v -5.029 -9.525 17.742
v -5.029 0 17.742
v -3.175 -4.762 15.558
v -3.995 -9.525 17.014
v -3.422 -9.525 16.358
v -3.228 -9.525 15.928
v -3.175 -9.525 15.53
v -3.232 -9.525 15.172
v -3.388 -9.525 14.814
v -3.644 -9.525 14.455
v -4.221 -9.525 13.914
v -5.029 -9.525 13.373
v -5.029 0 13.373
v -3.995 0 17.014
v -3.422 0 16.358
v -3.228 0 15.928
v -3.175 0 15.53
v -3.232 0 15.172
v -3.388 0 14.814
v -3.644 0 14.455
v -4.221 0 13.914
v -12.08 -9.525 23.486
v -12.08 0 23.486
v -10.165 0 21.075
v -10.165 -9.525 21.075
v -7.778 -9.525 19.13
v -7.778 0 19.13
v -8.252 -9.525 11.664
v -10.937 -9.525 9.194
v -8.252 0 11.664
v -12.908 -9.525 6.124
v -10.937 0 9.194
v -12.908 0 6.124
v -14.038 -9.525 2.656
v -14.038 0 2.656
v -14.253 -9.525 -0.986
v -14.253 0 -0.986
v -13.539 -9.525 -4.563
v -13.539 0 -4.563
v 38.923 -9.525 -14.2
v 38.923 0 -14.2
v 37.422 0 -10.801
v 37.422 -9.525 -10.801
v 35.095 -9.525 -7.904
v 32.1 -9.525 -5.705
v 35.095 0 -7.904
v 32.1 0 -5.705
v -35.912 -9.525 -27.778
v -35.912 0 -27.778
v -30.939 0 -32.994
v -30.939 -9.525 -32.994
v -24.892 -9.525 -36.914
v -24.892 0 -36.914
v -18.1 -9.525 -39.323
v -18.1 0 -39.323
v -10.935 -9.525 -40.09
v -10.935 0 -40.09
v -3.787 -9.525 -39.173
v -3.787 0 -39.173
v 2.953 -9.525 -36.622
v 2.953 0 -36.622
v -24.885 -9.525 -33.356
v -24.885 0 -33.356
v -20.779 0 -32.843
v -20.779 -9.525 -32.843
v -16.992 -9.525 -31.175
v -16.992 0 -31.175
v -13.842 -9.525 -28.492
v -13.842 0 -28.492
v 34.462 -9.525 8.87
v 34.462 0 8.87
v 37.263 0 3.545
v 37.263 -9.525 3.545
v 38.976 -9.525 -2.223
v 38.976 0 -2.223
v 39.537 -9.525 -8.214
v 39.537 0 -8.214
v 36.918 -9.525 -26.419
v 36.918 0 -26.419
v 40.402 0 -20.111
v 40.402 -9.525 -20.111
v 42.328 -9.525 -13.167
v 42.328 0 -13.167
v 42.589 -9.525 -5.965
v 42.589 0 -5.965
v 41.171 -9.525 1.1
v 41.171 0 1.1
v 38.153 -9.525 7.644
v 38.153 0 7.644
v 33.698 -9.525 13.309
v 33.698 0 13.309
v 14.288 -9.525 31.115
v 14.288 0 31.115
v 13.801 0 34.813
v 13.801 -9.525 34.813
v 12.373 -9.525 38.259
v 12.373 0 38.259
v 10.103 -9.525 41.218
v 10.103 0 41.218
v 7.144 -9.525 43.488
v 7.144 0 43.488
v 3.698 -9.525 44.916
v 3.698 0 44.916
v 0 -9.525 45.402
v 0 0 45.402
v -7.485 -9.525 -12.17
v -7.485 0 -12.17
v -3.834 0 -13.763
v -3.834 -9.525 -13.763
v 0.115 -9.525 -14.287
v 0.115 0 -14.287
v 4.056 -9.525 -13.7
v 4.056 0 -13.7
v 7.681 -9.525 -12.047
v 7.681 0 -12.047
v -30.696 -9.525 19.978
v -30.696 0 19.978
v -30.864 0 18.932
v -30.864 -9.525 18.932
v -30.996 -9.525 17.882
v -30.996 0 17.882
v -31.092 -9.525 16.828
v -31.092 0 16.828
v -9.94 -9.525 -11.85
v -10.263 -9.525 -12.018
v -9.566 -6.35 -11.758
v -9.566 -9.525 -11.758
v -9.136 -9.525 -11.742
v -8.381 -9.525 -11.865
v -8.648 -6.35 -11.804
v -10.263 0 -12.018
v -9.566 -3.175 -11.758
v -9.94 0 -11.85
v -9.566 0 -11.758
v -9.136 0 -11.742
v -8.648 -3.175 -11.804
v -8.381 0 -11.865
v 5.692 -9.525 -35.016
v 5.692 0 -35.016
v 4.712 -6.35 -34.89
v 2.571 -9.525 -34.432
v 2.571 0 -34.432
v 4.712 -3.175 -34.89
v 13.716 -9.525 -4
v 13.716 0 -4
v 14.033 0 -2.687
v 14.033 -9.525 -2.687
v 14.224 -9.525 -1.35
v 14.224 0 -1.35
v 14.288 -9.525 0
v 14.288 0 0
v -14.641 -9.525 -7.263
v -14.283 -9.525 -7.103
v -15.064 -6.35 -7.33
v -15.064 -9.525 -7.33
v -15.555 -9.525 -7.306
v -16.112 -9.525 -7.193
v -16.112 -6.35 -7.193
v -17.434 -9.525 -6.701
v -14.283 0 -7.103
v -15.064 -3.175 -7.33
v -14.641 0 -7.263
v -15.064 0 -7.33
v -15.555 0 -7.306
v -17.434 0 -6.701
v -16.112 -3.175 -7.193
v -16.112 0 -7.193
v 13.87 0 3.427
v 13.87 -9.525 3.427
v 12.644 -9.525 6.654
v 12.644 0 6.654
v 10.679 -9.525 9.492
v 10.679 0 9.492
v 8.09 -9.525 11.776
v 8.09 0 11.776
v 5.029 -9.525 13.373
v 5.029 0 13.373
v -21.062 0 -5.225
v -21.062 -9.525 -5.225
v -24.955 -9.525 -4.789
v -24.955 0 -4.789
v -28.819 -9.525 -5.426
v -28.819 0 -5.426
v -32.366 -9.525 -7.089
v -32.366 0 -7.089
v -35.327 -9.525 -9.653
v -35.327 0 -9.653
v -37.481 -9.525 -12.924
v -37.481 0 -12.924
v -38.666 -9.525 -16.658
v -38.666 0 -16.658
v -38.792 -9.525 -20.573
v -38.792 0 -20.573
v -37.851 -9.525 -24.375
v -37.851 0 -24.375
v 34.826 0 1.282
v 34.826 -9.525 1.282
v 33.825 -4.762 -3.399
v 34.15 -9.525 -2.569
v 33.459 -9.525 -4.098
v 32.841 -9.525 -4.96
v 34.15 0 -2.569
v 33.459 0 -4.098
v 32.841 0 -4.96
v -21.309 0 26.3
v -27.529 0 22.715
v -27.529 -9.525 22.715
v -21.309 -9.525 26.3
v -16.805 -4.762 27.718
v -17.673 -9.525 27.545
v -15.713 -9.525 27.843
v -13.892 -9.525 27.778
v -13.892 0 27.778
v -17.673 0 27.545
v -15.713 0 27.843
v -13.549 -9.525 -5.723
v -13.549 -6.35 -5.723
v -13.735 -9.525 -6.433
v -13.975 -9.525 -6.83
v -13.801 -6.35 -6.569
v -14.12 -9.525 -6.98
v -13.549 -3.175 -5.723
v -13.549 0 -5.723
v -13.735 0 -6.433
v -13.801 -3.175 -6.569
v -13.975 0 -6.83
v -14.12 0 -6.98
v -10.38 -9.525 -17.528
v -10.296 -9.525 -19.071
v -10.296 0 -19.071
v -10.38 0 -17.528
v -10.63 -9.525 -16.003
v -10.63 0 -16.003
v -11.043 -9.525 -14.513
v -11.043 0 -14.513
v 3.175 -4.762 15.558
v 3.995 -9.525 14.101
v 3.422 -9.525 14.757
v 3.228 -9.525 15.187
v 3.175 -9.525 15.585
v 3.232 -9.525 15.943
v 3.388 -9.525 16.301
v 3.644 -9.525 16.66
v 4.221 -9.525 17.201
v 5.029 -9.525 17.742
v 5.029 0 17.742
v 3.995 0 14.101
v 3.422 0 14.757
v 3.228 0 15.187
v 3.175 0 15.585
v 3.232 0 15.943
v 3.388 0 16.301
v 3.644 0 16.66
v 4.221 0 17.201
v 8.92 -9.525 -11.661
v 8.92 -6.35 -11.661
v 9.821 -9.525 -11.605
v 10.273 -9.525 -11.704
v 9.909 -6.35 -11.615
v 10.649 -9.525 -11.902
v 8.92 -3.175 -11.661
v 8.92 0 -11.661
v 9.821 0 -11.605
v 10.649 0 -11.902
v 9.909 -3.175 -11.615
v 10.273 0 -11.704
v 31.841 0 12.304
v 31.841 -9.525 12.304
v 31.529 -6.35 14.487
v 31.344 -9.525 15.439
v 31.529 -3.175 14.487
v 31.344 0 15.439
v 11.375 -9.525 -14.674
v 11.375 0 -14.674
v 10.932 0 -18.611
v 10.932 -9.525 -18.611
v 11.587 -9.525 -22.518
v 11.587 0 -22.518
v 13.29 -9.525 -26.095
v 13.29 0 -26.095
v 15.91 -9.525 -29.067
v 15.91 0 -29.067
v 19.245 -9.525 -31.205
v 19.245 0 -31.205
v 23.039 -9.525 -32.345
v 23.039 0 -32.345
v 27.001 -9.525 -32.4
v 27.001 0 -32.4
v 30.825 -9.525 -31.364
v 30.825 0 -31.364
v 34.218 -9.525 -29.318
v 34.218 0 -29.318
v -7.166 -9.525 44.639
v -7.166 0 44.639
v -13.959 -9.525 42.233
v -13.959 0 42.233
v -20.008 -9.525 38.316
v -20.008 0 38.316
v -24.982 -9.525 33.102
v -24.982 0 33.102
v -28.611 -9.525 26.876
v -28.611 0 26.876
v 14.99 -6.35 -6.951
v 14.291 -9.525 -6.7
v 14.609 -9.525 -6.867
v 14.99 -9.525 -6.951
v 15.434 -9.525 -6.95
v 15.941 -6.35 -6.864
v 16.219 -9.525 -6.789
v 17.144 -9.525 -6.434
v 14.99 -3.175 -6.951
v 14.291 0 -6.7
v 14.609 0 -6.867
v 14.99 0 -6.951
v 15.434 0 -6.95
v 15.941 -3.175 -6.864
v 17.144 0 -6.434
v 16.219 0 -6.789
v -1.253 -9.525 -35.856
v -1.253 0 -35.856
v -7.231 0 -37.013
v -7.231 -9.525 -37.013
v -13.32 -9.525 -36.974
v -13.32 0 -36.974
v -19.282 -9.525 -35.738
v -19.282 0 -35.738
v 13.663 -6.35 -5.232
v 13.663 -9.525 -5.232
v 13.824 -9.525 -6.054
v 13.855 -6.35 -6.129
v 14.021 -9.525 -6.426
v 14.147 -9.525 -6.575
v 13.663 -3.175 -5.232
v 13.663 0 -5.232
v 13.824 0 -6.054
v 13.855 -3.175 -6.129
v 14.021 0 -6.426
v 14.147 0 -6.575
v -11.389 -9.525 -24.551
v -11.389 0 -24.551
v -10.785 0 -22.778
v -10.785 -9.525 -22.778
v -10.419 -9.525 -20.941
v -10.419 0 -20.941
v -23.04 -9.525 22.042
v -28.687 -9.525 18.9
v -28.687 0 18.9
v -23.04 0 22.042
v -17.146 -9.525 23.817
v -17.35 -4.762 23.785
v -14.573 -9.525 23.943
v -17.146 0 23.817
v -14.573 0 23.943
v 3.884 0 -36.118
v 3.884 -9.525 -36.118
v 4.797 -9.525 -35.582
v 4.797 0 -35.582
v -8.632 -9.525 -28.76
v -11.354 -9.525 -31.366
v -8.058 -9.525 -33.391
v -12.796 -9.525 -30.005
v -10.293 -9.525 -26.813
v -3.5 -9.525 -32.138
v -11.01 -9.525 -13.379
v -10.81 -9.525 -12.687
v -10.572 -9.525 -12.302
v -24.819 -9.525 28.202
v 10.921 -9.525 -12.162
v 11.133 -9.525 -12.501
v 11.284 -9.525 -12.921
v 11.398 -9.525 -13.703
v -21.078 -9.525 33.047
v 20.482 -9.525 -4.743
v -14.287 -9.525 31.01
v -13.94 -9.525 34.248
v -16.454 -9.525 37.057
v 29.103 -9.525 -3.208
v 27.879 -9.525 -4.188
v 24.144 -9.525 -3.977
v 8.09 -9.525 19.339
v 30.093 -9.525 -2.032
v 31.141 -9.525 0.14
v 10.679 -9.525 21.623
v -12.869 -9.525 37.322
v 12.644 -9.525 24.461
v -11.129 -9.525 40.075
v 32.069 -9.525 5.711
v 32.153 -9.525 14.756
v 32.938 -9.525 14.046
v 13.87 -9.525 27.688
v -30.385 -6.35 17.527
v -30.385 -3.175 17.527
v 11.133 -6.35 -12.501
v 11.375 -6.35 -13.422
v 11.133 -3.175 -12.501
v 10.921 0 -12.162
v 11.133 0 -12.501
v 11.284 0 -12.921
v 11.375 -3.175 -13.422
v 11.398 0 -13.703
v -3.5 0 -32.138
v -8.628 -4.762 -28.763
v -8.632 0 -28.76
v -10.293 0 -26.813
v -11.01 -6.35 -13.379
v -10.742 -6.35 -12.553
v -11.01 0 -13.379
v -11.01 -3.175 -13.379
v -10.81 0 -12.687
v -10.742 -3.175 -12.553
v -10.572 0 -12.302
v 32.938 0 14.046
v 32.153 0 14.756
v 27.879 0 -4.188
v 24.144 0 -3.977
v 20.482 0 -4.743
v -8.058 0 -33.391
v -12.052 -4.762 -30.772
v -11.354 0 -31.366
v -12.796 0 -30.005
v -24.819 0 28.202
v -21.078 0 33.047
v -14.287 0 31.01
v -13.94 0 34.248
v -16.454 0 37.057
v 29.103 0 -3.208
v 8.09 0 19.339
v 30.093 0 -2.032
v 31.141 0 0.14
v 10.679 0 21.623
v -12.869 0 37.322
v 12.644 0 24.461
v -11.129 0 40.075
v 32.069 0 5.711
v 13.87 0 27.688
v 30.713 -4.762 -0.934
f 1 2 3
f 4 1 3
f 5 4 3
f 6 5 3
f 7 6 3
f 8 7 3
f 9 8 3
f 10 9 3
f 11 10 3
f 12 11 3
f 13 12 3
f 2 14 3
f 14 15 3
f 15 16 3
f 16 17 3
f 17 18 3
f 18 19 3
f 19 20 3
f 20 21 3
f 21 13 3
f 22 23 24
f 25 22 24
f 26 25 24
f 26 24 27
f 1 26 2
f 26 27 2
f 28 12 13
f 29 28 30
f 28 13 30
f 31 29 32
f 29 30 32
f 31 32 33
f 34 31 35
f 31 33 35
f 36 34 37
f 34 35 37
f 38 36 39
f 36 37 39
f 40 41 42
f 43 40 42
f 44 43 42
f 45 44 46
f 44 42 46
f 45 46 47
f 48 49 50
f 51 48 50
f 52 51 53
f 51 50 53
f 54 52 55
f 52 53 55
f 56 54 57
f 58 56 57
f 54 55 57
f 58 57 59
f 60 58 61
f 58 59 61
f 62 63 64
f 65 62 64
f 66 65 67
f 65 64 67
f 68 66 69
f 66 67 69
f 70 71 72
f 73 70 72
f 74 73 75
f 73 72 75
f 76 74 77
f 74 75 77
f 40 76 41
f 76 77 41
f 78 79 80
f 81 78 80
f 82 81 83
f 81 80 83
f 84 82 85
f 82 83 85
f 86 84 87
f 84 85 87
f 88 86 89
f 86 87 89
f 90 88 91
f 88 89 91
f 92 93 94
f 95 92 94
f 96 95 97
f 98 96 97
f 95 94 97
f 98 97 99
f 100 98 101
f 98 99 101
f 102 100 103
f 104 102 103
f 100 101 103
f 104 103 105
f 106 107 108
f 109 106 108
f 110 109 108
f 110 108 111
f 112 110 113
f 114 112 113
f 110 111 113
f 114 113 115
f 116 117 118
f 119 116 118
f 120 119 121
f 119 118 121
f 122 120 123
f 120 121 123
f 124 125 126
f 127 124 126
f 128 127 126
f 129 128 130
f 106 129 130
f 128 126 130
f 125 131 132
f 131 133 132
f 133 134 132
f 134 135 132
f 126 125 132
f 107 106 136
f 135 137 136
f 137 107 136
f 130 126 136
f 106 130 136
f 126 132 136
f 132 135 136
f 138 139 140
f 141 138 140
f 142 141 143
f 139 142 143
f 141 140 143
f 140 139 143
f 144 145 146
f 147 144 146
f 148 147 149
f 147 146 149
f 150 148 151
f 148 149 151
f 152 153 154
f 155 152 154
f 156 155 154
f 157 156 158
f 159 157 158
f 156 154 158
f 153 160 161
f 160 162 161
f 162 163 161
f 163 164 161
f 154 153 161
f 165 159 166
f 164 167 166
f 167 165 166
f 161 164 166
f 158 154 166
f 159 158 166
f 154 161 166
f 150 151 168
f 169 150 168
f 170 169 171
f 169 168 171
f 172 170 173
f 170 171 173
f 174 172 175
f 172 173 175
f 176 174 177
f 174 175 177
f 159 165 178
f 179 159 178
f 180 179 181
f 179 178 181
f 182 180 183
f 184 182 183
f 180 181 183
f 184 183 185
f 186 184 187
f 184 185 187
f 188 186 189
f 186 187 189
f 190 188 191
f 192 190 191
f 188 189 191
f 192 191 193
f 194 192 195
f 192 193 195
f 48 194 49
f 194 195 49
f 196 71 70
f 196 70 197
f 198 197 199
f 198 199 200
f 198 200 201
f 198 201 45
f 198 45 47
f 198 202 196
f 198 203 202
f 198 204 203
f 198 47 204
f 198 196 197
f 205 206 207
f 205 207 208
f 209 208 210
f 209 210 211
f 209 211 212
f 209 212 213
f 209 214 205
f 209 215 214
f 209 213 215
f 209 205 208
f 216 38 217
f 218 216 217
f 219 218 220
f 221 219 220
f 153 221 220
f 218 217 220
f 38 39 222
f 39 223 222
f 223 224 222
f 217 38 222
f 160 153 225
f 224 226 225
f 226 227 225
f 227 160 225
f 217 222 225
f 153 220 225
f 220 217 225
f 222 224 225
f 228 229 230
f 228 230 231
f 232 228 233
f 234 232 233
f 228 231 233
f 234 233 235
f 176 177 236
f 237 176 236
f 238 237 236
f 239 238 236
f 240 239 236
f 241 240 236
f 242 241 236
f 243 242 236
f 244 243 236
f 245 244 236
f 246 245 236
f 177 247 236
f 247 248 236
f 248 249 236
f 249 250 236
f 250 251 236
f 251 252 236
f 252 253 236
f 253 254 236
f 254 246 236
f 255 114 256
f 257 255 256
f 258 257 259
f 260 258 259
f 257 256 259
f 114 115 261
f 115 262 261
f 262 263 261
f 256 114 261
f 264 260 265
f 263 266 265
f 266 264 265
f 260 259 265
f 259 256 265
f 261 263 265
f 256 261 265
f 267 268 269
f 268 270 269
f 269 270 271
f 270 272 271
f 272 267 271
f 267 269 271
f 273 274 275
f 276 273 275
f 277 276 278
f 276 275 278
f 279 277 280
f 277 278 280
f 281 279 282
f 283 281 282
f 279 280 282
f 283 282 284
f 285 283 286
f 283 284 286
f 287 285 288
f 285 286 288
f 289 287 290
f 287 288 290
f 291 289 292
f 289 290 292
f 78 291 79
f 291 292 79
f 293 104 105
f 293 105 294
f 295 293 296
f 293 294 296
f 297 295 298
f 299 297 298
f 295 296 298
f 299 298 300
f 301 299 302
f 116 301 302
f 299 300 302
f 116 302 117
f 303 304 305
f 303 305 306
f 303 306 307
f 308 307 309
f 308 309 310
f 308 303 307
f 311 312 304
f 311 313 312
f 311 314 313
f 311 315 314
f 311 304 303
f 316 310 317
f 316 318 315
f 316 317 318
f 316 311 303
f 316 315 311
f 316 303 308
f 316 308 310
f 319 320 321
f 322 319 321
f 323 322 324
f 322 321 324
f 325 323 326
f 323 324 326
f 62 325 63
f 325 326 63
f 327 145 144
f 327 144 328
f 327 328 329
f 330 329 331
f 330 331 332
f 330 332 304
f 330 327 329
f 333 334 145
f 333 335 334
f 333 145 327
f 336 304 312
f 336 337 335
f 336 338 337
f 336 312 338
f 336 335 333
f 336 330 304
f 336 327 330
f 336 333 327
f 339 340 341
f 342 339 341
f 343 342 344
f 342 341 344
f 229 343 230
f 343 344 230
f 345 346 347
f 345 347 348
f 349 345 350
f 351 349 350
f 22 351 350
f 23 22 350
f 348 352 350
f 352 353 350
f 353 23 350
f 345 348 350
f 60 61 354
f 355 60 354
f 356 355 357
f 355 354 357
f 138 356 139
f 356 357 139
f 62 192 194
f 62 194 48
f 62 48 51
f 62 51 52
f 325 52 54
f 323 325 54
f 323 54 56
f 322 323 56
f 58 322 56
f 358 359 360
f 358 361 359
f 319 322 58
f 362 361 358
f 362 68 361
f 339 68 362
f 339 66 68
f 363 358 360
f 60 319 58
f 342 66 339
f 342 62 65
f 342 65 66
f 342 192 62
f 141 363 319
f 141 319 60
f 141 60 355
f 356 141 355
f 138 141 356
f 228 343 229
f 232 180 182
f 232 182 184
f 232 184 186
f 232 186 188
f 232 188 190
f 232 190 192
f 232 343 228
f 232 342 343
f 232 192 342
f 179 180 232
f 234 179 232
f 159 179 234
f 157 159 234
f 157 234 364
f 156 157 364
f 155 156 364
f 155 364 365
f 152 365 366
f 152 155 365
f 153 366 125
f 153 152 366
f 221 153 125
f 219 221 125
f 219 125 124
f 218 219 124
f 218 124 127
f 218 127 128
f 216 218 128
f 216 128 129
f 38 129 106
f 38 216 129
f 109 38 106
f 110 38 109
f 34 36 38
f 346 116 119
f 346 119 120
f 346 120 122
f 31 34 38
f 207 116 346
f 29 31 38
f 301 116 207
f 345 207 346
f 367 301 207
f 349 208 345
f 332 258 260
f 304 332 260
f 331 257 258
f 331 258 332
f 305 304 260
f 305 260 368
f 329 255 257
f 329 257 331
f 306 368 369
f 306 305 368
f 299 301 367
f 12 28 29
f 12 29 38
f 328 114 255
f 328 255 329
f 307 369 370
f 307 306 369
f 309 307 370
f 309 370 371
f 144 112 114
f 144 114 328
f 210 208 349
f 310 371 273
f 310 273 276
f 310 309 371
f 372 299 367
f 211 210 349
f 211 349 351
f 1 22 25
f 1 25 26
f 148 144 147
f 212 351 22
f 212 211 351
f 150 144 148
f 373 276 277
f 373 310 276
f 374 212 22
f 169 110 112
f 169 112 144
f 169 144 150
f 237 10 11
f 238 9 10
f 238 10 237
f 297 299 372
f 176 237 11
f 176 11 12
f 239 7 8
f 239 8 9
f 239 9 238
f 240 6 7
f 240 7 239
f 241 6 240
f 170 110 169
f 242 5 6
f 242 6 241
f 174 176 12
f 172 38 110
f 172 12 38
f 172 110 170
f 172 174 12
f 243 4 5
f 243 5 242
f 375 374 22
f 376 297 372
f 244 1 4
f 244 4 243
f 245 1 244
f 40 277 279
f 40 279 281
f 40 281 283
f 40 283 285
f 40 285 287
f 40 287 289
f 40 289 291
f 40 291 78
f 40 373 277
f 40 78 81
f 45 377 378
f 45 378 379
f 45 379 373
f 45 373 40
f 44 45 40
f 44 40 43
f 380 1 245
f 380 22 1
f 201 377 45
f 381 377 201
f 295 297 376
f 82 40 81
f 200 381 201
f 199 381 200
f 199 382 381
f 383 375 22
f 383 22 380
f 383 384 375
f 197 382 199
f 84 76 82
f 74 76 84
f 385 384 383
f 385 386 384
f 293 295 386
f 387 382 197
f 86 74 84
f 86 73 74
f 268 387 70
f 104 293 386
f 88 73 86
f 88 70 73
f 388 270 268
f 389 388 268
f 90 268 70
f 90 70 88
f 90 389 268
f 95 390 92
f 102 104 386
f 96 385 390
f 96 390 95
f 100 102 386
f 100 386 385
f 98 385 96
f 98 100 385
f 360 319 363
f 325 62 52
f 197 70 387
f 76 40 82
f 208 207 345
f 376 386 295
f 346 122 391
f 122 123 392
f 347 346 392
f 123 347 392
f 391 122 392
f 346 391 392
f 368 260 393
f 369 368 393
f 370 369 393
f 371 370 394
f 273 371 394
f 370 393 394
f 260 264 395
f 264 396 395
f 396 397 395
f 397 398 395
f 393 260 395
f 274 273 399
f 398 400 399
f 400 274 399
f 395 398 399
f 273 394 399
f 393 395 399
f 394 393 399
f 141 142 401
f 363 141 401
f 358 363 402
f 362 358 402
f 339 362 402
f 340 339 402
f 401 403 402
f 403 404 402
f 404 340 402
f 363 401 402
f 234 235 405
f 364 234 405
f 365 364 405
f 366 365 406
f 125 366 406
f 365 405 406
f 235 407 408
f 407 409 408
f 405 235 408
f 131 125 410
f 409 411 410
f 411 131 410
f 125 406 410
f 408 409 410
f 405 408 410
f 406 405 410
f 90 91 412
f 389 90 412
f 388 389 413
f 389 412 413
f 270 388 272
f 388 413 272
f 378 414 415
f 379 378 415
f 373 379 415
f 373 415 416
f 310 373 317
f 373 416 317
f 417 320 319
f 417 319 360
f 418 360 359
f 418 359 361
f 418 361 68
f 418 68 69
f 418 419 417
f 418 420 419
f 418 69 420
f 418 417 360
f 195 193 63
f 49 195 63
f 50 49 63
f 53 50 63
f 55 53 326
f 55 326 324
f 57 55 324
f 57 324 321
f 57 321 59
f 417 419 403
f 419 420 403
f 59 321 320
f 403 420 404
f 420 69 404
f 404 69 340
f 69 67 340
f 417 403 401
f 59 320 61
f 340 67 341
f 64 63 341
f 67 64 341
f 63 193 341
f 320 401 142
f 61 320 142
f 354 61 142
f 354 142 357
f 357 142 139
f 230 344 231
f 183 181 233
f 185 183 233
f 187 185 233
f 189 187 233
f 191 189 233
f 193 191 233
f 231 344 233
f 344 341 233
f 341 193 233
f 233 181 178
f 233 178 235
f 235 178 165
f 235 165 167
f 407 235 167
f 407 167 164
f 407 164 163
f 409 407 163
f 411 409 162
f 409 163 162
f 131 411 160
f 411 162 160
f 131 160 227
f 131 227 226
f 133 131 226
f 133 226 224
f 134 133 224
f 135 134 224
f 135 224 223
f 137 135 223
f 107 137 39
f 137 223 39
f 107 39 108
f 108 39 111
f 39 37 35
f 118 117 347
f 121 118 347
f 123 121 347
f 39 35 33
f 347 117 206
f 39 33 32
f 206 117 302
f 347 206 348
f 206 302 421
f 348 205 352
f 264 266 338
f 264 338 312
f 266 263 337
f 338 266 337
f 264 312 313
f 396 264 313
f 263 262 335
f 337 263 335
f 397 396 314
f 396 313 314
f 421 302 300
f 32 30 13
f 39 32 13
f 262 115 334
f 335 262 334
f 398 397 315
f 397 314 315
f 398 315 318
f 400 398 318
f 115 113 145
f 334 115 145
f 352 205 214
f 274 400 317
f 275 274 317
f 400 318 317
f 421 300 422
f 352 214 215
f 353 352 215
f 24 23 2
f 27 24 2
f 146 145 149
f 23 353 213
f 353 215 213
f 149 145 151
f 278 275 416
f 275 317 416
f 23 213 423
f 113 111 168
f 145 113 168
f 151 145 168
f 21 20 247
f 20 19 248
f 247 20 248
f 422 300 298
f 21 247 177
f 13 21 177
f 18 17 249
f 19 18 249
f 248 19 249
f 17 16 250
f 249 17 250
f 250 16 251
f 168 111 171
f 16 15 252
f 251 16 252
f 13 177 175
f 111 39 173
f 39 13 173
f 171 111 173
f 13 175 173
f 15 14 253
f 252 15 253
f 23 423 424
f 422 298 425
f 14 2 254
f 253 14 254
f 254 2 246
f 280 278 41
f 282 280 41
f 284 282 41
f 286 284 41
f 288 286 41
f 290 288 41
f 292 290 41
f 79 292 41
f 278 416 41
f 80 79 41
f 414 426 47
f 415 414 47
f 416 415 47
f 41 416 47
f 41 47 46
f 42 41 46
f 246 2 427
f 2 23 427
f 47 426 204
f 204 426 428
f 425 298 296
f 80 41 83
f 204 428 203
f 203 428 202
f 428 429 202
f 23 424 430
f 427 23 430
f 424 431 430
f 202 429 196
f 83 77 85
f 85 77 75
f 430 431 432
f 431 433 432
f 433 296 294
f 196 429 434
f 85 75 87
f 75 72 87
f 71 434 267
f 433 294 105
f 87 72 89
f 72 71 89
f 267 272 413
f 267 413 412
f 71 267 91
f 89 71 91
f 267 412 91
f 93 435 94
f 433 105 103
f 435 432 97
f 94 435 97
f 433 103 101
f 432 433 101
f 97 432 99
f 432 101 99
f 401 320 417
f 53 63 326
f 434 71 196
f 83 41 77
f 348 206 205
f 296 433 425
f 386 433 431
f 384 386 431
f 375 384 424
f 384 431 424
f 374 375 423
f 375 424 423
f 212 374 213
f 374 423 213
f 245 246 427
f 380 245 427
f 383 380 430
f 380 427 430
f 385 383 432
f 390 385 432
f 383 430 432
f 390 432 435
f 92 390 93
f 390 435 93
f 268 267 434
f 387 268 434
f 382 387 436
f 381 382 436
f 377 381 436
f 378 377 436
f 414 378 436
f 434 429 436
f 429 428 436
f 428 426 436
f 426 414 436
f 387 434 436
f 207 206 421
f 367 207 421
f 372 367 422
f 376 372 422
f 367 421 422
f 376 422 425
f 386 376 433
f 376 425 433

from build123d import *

# Parameters (mm, degrees)
F1_DEPTH = 9.525


with BuildPart() as f1:
    # F0 (on Front) → F1 (new body)
    with BuildSketch(Plane.XZ):
        with BuildLine():
            ThreePointArc((-11.129209475, 40.07453976), (-6.1694096933, 44.0018553296), (0, 45.4025))
            ThreePointArc((0, 45.4025), (-20.0075890018, 38.315719416), (-30.6961632928, 19.977768158))
            add(Edge.make_bspline(
                [(-30.6961632928, 19.977768158), (-29.8732969424, 20.8625993593), (-28.7796279343, 21.8030494207), (-27.5291002849, 22.7145349079)],
                knots=[0, 0, 0, 0, 0.1348905301, 0.1348905301, 0.1348905301, 0.1348905301], degree=3))
            ThreePointArc((-27.5291002849, 22.7145349079), (-21.0778351337, 33.046504915), (-11.129209475, 40.07453976))
        make_face()
        with BuildLine():
            add(Edge.make_bspline(
                [(-28.6868006646, 18.9004611224), (-25.471724073, 21.217375219), (-18.5226553299, 24.2515843699), (-13.8399380373, 24.0105914656), (-12.0803576364, 23.4862638251)],
                knots=[0.1069472615, 0.1069472615, 0.1069472615, 0.1069472615, 0.4758142615, 0.6708512149, 0.6708512149, 0.6708512149, 0.6708512149], degree=3))
            ThreePointArc((-12.0803576364, 23.4862638251), (-13.1625273264, 25.5579746599), (-13.8924363743, 27.778404754))
            add(Edge.make_bspline(
                [(-27.5291002849, 22.7145349079), (-24.3443673609, 25.0358253187), (-18.8443936536, 27.8282133181), (-14.8257797974, 27.9053631578), (-13.8924363743, 27.778404754)],
                knots=[0.1348905301, 0.1348905301, 0.1348905301, 0.1348905301, 0.4784177706, 0.5845231195, 0.5845231195, 0.5845231195, 0.5845231195], degree=3))
            ThreePointArc((-27.5291002849, 22.7145349079), (-28.1696370718, 20.8262219835), (-28.6868006646, 18.9004611224))
        make_face()
        with BuildLine():
            add(Edge.make_bspline(
                [(-31.0916826129, 16.8275), (-30.4392772685, 17.5290338571), (-29.618962222, 18.2287078403), (-28.6868006646, 18.9004611224)],
                knots=[0, 0, 0, 0, 0.1069472615, 0.1069472615, 0.1069472615, 0.1069472615], degree=3))
            ThreePointArc((-28.6868006646, 18.9004611224), (-28.1696370718, 20.8262219835), (-27.5291002849, 22.7145349079))
            add(Edge.make_bspline(
                [(-30.6961632928, 19.977768158), (-29.8732969424, 20.8625993593), (-28.7796279343, 21.8030494207), (-27.5291002849, 22.7145349079)],
                knots=[0, 0, 0, 0, 0.1348905301, 0.1348905301, 0.1348905301, 0.1348905301], degree=3))
            ThreePointArc((-30.6961632928, 19.977768158), (-30.9344924851, 18.4077276244), (-31.0916826129, 16.8275))
        make_face()
        with BuildLine():
            Line((0, 17.7419), (5.0292, 17.7419))
            ThreePointArc((5.0292, 17.7419), (11.7470709381, 22.9824124275), (14.2875, 31.115))
            ThreePointArc((14.2875, 31.115), (10.1027881362, 41.2177881362), (0, 45.4025))
            ThreePointArc((0, 45.4025), (-6.1694096933, 44.0018553296), (-11.129209475, 40.07453976))
            ThreePointArc((-11.129209475, 40.07453976), (-13.9398502242, 34.2476078555), (-13.8924363743, 27.778404754))
            ThreePointArc((-13.8924363743, 27.778404754), (-13.1625273264, 25.5579746599), (-12.0803576364, 23.4862638251))
            add(Edge.make_bspline(
                [(-12.0803576364, 23.4862638251), (-9.3691650731, 22.6783705347), (-6.3256595121, 20.8235485627), (-1.4460519065, 17.7419)],
                knots=[0.6708512149, 0.6708512149, 0.6708512149, 0.6708512149, 0.9713675979, 0.9713675979, 0.9713675979, 0.9713675979], degree=3))
            Line((-1.4460519065, 17.7419), (0, 17.7419))
        make_face()
        with BuildLine():
            Line((0, 0), (0, 13.3731))
            Line((0, 13.3731), (-5.0292, 13.3731))
            ThreePointArc((-5.0292, 13.3731), (-12.9083286672, 6.1243536206), (-13.5391458418, -4.5633525092))
            Line((-13.5391458418, -4.5633525092), (-10.567475758, -8.1956244248))
            Line((-10.567475758, -8.1956244248), (0, 0))
        make_face()
        with BuildLine():
            Line((7.68096, -12.04722), (10.69848, -8.02386))
            Line((10.69848, -8.02386), (0, 0))
            Line((0, 0), (-10.567475758, -8.1956244248))
            Line((-10.567475758, -8.1956244248), (-7.4853605897, -12.1697178723))
            ThreePointArc((-7.4853605897, -12.1697178723), (0.1153959033, -14.2870339831), (7.68096, -12.04722))
        make_face()
        with BuildLine():
            ThreePointArc((13.716, -4.0005), (14.1439033907, -2.0205576272), (14.2875, 0))
            ThreePointArc((14.2875, 0), (11.7470709381, 8.1325875725), (5.0292, 13.3731))
            Line((5.0292, 13.3731), (0, 13.3731))
            Line((0, 13.3731), (0, 0))
            Line((0, 0), (10.69848, -8.02386))
            Line((10.69848, -8.02386), (13.716, -4.0005))
        make_face()
        with BuildLine():
            Line((-13.9676082789, -10.9385280006), (-17.4340494965, -6.7014973993))
            ThreePointArc((-17.4340494965, -6.7014973993), (-35.3273131475, -9.6527326912), (-35.9117299253, -27.7783259466))
            ThreePointArc((-35.9117299253, -27.7783259466), (-31.032718707, -31.8206450649), (-24.885458426, -33.3556647255))
            ThreePointArc((-24.885458426, -33.3556647255), (-18.8250004476, -32.1468405376), (-13.8419410266, -28.4917720524))
            ThreePointArc((-13.8419410266, -28.4917720524), (-12.4543976012, -26.6218063281), (-11.389028977, -24.5512899041))
            add(Edge.make_bspline(
                [(-11.389028977, -24.5512899041), (-12.3646530193, -21.76015904), (-12.5856012494, -17.9957568314), (-13.1111198001, -11.9854137449)],
                knots=[0.6610434599, 0.6610434599, 0.6610434599, 0.6610434599, 0.9728634598, 0.9728634598, 0.9728634598, 0.9728634598], degree=3))
            Line((-13.1111198001, -11.9854137449), (-13.9676082789, -10.9385280006))
        make_face()
        with BuildLine():
            ThreePointArc((-24.885458426, -33.3556647255), (-31.032718707, -31.8206450649), (-35.9117299253, -27.7783259466))
            ThreePointArc((-35.9117299253, -27.7783259466), (-18.1000815921, -39.3226431793), (2.9529758884, -36.6217456555))
            add(Edge.make_bspline(
                [(2.9529758884, -36.6217456555), (1.7441334307, -36.5080110042), (0.289714726, -36.2464243625), (-1.2530470809, -35.8557527174)],
                knots=[0, 0, 0, 0, 0.1355449187, 0.1355449187, 0.1355449187, 0.1355449187], degree=3))
            ThreePointArc((-1.2530470809, -35.8557527174), (-13.3197478248, -36.9735464074), (-24.885458426, -33.3556647255))
        make_face()
        with BuildLine():
            add(Edge.make_bspline(
                [(2.5707142816, -34.4324261726), (-1.3456831321, -33.4037669395), (-8.2729367844, -30.1510829264), (-10.8093388321, -26.2097064508), (-11.389028977, -24.5512899041)],
                knots=[0.1056482335, 0.1056482335, 0.1056482335, 0.1056482335, 0.4757682175, 0.6610434599, 0.6610434599, 0.6610434599, 0.6610434599], degree=3))
            ThreePointArc((-11.389028977, -24.5512899041), (-12.4543976012, -26.6218063281), (-13.8419410266, -28.4917720524))
            add(Edge.make_bspline(
                [(-1.2530470809, -35.8557527174), (-5.1248015795, -34.8753131625), (-10.8958886067, -32.5379694207), (-13.3907983481, -29.3235619339), (-13.8419410266, -28.4917720524)],
                knots=[0.1355449187, 0.1355449187, 0.1355449187, 0.1355449187, 0.4757119144, 0.578874394, 0.578874394, 0.578874394, 0.578874394], degree=3))
            ThreePointArc((-1.2530470809, -35.8557527174), (0.6823987023, -35.2073970019), (2.5707142816, -34.4324261726))
        make_face()
        with BuildLine():
            add(Edge.make_bspline(
                [(2.9529758884, -36.6217456555), (1.7441334307, -36.5080110042), (0.289714726, -36.2464243625), (-1.2530470809, -35.8557527174)],
                knots=[0, 0, 0, 0, 0.1355449187, 0.1355449187, 0.1355449187, 0.1355449187], degree=3))
            ThreePointArc((2.9529758884, -36.6217456555), (4.3430288168, -35.8539039157), (5.691711479, -35.0155226433))
            add(Edge.make_bspline(
                [(5.691711479, -35.0155226433), (4.7494993224, -34.9268740601), (3.6886233005, -34.7260499581), (2.5707142816, -34.4324261726)],
                knots=[0, 0, 0, 0, 0.1056482335, 0.1056482335, 0.1056482335, 0.1056482335], degree=3))
            ThreePointArc((2.5707142816, -34.4324261726), (0.6823987023, -35.2073970019), (-1.2530470809, -35.8557527174))
        make_face()
        with BuildLine():
            ThreePointArc((-10.2963348681, -19.0713488693), (-10.4841982585, -16.7620408074), (-11.0428480755, -14.5134619762))
            Line((-11.0428480755, -14.5134619762), (-13.1111198001, -11.9854137449))
            add(Edge.make_bspline(
                [(-11.389028977, -24.5512899041), (-12.3646530193, -21.76015904), (-12.5856012494, -17.9957568314), (-13.1111198001, -11.9854137449)],
                knots=[0.6610434599, 0.6610434599, 0.6610434599, 0.6610434599, 0.9728634598, 0.9728634598, 0.9728634598, 0.9728634598], degree=3))
            ThreePointArc((-11.389028977, -24.5512899041), (-10.5721710587, -21.8652589502), (-10.2963348681, -19.0713488693))
        make_face()
        with BuildLine():
            ThreePointArc((32.0997847077, -5.7054719377), (30.0493612315, -4.7798546786), (27.8790629668, -4.18756321))
            add(Edge.make_bspline(
                [(27.8790629668, -4.18756321), (25.2291990999, -5.9648942607), (21.1306497697, -6.9726602139), (15.0740755277, -9.3907834095)],
                knots=[0.6365548592, 0.6365548592, 0.6365548592, 0.6365548592, 0.9719102302, 0.9719102302, 0.9719102302, 0.9719102302], degree=3))
            Line((15.0740755277, -9.3907834095), (14.2596788218, -10.5538624417))
            Line((14.2596788218, -10.5538624417), (11.3750482081, -14.6735419029))
            ThreePointArc((11.3750482081, -14.6735419029), (19.2451031931, -31.2051730294), (36.9179158581, -26.4193308171))
            ThreePointArc((36.9179158581, -26.4193308171), (38.8405119591, -22.5206915931), (39.5017810253, -18.2243574827))
            ThreePointArc((39.5017810253, -18.2243574827), (39.3564283292, -16.1915451737), (38.9233277082, -14.2000941595))
            ThreePointArc((38.9233277082, -14.2000941595), (36.3531107601, -9.2767808058), (32.0997847077, -5.7054719377))
        make_face()
        with BuildLine():
            ThreePointArc((39.5017810253, -18.2243574827), (38.8405119591, -22.5206915931), (36.9179158581, -26.4193308171))
            ThreePointArc((36.9179158581, -26.4193308171), (42.5886466549, -5.9652630323), (33.6977907453, 13.3085211811))
            add(Edge.make_bspline(
                [(33.6977907453, 13.3085211811), (33.9558103868, 12.1027186731), (34.2379640164, 10.5592509332), (34.462076145, 8.8704255659)],
                knots=[0, 0, 0, 0, 0.1376568503, 0.1376568503, 0.1376568503, 0.1376568503], degree=3))
            ThreePointArc((34.462076145, 8.8704255659), (38.9762030058, -2.2232632841), (38.9233277082, -14.2000941595))
            ThreePointArc((38.9233277082, -14.2000941595), (39.3564283292, -16.1915451737), (39.5017810253, -18.2243574827))
        make_face()
        with BuildLine():
            add(Edge.make_bspline(
                [(31.8414742693, 12.3036304451), (32.3280250776, 8.0211958063), (32.2602508843, 0.0575755824), (29.1277551626, -3.3500336145), (27.8790629668, -4.18756321)],
                knots=[0.1025479244, 0.1025479244, 0.1025479244, 0.1025479244, 0.478525747, 0.6365548592, 0.6365548592, 0.6365548592, 0.6365548592], degree=3))
            ThreePointArc((27.8790629668, -4.18756321), (30.0493612315, -4.7798546786), (32.0997847077, -5.7054719377))
            add(Edge.make_bspline(
                [(34.462076145, 8.8704255659), (35.0151869373, 4.7023890447), (35.2758794407, -1.8985489034), (32.8255865271, -5.0775489081), (32.0997847077, -5.7054719377)],
                knots=[0.1376568503, 0.1376568503, 0.1376568503, 0.1376568503, 0.4773952215, 0.5814339254, 0.5814339254, 0.5814339254, 0.5814339254], degree=3))
            ThreePointArc((34.462076145, 8.8704255659), (33.211954226, 10.6329632919), (31.8414742693, 12.3036304451))
        make_face()
        with BuildLine():
            add(Edge.make_bspline(
                [(31.3441027058, 15.4394312244), (31.5363152882, 14.5411646712), (31.7087675709, 13.4716641889), (31.8414742693, 12.3036304451)],
                knots=[0, 0, 0, 0, 0.1025479244, 0.1025479244, 0.1025479244, 0.1025479244], degree=3))
            ThreePointArc((31.8414742693, 12.3036304451), (33.211954226, 10.6329632919), (34.462076145, 8.8704255659))
            add(Edge.make_bspline(
                [(33.6977907453, 13.3085211811), (33.9558103868, 12.1027186731), (34.2379640164, 10.5592509332), (34.462076145, 8.8704255659)],
                knots=[0, 0, 0, 0, 0.1376568503, 0.1376568503, 0.1376568503, 0.1376568503], degree=3))
            ThreePointArc((33.6977907453, 13.3085211811), (32.5483888414, 14.4042872804), (31.3441027058, 15.4394312244))
        make_face()
        with BuildLine():
            ThreePointArc((27.8790629668, -4.18756321), (22.2875347291, -4.2398370273), (17.1443094355, -6.4341829806))
            Line((17.1443094355, -6.4341829806), (15.0740755277, -9.3907834095))
            add(Edge.make_bspline(
                [(27.8790629668, -4.18756321), (25.2291990999, -5.9648942607), (21.1306497697, -6.9726602139), (15.0740755277, -9.3907834095)],
                knots=[0.6365548592, 0.6365548592, 0.6365548592, 0.6365548592, 0.9719102302, 0.9719102302, 0.9719102302, 0.9719102302], degree=3))
        make_face()
        with BuildLine():
            ThreePointArc((-13.255939811, -10.364371792), (-15.16521869, -8.3278705899), (-17.4340494965, -6.7014973993))
            Line((-17.4340494965, -6.7014973993), (-13.9676082789, -10.9385280006))
            Line((-13.9676082789, -10.9385280006), (-13.1111198001, -11.9854137449))
            add(Edge.make_bspline(
                [(-13.1111198001, -11.9854137449), (-13.156853734, -11.4623558379), (-13.2048943545, -10.9222881259), (-13.255939811, -10.364371792)],
                knots=[0.9728634598, 0.9728634598, 0.9728634598, 0.9728634598, 1, 1, 1, 1], degree=3))
        make_face()
        with BuildLine():
            Line((-13.1111198001, -11.9854137449), (-11.0428480755, -14.5134619762))
            ThreePointArc((-11.0428480755, -14.5134619762), (-11.9775246049, -12.3472431446), (-13.255939811, -10.364371792))
            add(Edge.make_bspline(
                [(-13.1111198001, -11.9854137449), (-13.156853734, -11.4623558379), (-13.2048943545, -10.9222881259), (-13.255939811, -10.364371792)],
                knots=[0.9728634598, 0.9728634598, 0.9728634598, 0.9728634598, 1, 1, 1, 1], degree=3))
        make_face()
        with BuildLine():
            Line((-7.4853605897, -12.1697178723), (-10.567475758, -8.1956244248))
            Line((-10.567475758, -8.1956244248), (-11.290038203, -8.7560090009))
            ThreePointArc((-11.290038203, -8.7560090009), (-11.0362642828, -9.0737823938), (-10.7735491675, -9.3842045259))
            ThreePointArc((-10.7735491675, -9.3842045259), (-9.2350808081, -10.9016484404), (-7.4853605897, -12.1697178723))
        make_face()
        with BuildLine():
            Line((-10.567475758, -8.1956244248), (-13.5391458418, -4.5633525092))
            ThreePointArc((-13.5391458418, -4.5633525092), (-12.5903410279, -6.7539595092), (-11.290038203, -8.7560090009))
            Line((-11.290038203, -8.7560090009), (-10.567475758, -8.1956244248))
        make_face()
        with BuildLine():
            ThreePointArc((-11.290038203, -8.7560090009), (-12.5903410279, -6.7539595092), (-13.5391458418, -4.5633525092))
            add(Edge.make_bspline(
                [(-13.5391458418, -4.5633525092), (-13.4226119292, -5.8796905186), (-13.6904197886, -6.7257157353), (-14.2834424959, -7.1028133864)],
                knots=[0, 0, 0, 0, 0.477205225, 0.477205225, 0.477205225, 0.477205225], degree=3))
            Line((-14.2834424959, -7.1028133864), (-11.290038203, -8.7560090009))
        make_face()
        with BuildLine():
            add(Edge.make_bspline(
                [(-10.2625355182, -12.0175674064), (-9.6681783354, -11.6099962054), (-8.7776105432, -11.6390201447), (-7.4853605897, -12.1697178723)],
                knots=[0.492293427, 0.492293427, 0.492293427, 0.492293427, 1, 1, 1, 1], degree=3))
            ThreePointArc((-7.4853605897, -12.1697178723), (-9.2350808081, -10.9016484404), (-10.7735491675, -9.3842045259))
            Line((-10.7735491675, -9.3842045259), (-10.2625355182, -12.0175674064))
        make_face()
        with BuildLine():
            add(Edge.make_bspline(
                [(-11.0428480755, -14.5134619762), (-11.1366637871, -13.2184522936), (-10.8388489834, -12.4127654086), (-10.2625355182, -12.0175674064)],
                knots=[0, 0, 0, 0, 0.492293427, 0.492293427, 0.492293427, 0.492293427], degree=3))
            Line((-10.2625355182, -12.0175674064), (-12.272989007, -9.5601903964))
            Line((-12.272989007, -9.5601903964), (-13.255939811, -10.364371792))
            ThreePointArc((-13.255939811, -10.364371792), (-11.9775246049, -12.3472431446), (-11.0428480755, -14.5134619762))
        make_face()
        with BuildLine():
            Line((-12.272989007, -9.5601903964), (-14.2834424959, -7.1028133864))
            add(Edge.make_bspline(
                [(-14.2834424959, -7.1028133864), (-14.9331193153, -7.5159368632), (-15.9731176237, -7.3662554535), (-17.4340494965, -6.7014973993)],
                knots=[0.477205225, 0.477205225, 0.477205225, 0.477205225, 1, 1, 1, 1], degree=3))
            ThreePointArc((-17.4340494965, -6.7014973993), (-15.16521869, -8.3278705899), (-13.255939811, -10.364371792))
            Line((-13.255939811, -10.364371792), (-12.272989007, -9.5601903964))
        make_face()
        Polygon((-12.272989007, -9.5601903964), (-11.290038203, -8.7560090009), (-14.2834424959, -7.1028133864), align=None)
        with BuildLine():
            ThreePointArc((-10.7735491675, -9.3842045259), (-11.0362642828, -9.0737823938), (-11.290038203, -8.7560090009))
            Line((-11.290038203, -8.7560090009), (-12.272989007, -9.5601903964))
            Line((-12.272989007, -9.5601903964), (-10.2625355182, -12.0175674064))
            Line((-10.2625355182, -12.0175674064), (-10.7735491675, -9.3842045259))
        make_face()
        with BuildLine():
            add(Edge.make_bspline(
                [(15.0740755277, -9.3907834095), (14.5667695735, -9.5933283212), (14.0457262352, -9.8057682139), (13.5106461925, -10.0293841483)],
                knots=[0.9719102302, 0.9719102302, 0.9719102302, 0.9719102302, 1, 1, 1, 1], degree=3))
            ThreePointArc((13.5106461925, -10.0293841483), (12.2334654785, -12.2551796505), (11.3750482081, -14.6735419029))
            Line((11.3750482081, -14.6735419029), (14.2596788218, -10.5538624417))
            Line((14.2596788218, -10.5538624417), (15.0740755277, -9.3907834095))
        make_face()
        with BuildLine():
            Line((15.0740755277, -9.3907834095), (17.1443094355, -6.4341829806))
            ThreePointArc((17.1443094355, -6.4341829806), (15.1653882705, -8.0679599593), (13.5106461925, -10.0293841483))
            add(Edge.make_bspline(
                [(15.0740755277, -9.3907834095), (14.5667695735, -9.5933283212), (14.0457262352, -9.8057682139), (13.5106461925, -10.0293841483)],
                knots=[0.9719102302, 0.9719102302, 0.9719102302, 0.9719102302, 1, 1, 1, 1], degree=3))
        make_face()
        with BuildLine():
            add(Edge.make_bspline(
                [(14.2914282817, -6.7001343335), (14.8618986093, -7.1177709077), (15.8163336521, -7.0374427595), (17.1443094355, -6.4341829806)],
                knots=[0.4953346539, 0.4953346539, 0.4953346539, 0.4953346539, 1, 1, 1, 1], degree=3))
            Line((14.2914282817, -6.7001343335), (12.4703230962, -9.3009420742))
            Line((12.4703230962, -9.3009420742), (13.5106461925, -10.0293841483))
            ThreePointArc((13.5106461925, -10.0293841483), (15.1653882705, -8.0679599593), (17.1443094355, -6.4341829806))
        make_face()
        with BuildLine():
            Line((14.2914282817, -6.7001343335), (11.8069089542, -8.0454681155))
            ThreePointArc((11.8069089542, -8.0454681155), (11.6214424702, -8.3111209329), (11.43, -8.5725))
            Line((11.43, -8.5725), (12.4703230962, -9.3009420742))
            Line((12.4703230962, -9.3009420742), (14.2914282817, -6.7001343335))
        make_face()
        with BuildLine():
            add(Edge.make_bspline(
                [(13.716, -4.0005), (13.5414801517, -5.4005831067), (13.731505306, -6.2902193879), (14.2914282817, -6.7001343335)],
                knots=[0, 0, 0, 0, 0.4953346539, 0.4953346539, 0.4953346539, 0.4953346539], degree=3))
            ThreePointArc((13.716, -4.0005), (12.9207260684, -6.0981549763), (11.8069089542, -8.0454681155))
            Line((11.8069089542, -8.0454681155), (14.2914282817, -6.7001343335))
        make_face()
        with BuildLine():
            ThreePointArc((11.8069089542, -8.0454681155), (12.9207260684, -6.0981549763), (13.716, -4.0005))
            Line((13.716, -4.0005), (10.69848, -8.02386))
            Line((10.69848, -8.02386), (11.43, -8.5725))
            ThreePointArc((11.43, -8.5725), (11.6214424702, -8.3111209329), (11.8069089542, -8.0454681155))
        make_face()
        with BuildLine():
            Line((11.43, -8.5725), (10.69848, -8.02386))
            Line((10.69848, -8.02386), (7.68096, -12.04722))
            ThreePointArc((7.68096, -12.04722), (9.7121376535, -10.478885363), (11.43, -8.5725))
        make_face()
        with BuildLine():
            Line((10.6492179108, -11.9017498148), (11.43, -8.5725))
            ThreePointArc((11.43, -8.5725), (9.7121376535, -10.478885363), (7.68096, -12.04722))
            add(Edge.make_bspline(
                [(7.68096, -12.04722), (9.0441819802, -11.4883481778), (10.0338975357, -11.4521388123), (10.6492179108, -11.9017498148)],
                knots=[0, 0, 0, 0, 0.5045647338, 0.5045647338, 0.5045647338, 0.5045647338], degree=3))
        make_face()
        Polygon((12.4703230962, -9.3009420742), (11.43, -8.5725), (10.6492179108, -11.9017498148), align=None)
        with BuildLine():
            Line((13.5106461925, -10.0293841483), (12.4703230962, -9.3009420742))
            Line((12.4703230962, -9.3009420742), (10.6492179108, -11.9017498148))
            add(Edge.make_bspline(
                [(10.6492179108, -11.9017498148), (11.2534048337, -12.3432256687), (11.4966224299, -13.2531003167), (11.3750482081, -14.6735419029)],
                knots=[0.5045647338, 0.5045647338, 0.5045647338, 0.5045647338, 1, 1, 1, 1], degree=3))
            ThreePointArc((11.3750482081, -14.6735419029), (12.2334654785, -12.2551796505), (13.5106461925, -10.0293841483))
        make_face()
        with BuildLine():
            ThreePointArc((-12.0803576364, 23.4862638251), (-9.0240605919, 20.0380425349), (-5.0292, 17.7419))
            Line((-5.0292, 17.7419), (-1.4460519065, 17.7419))
            add(Edge.make_bspline(
                [(-12.0803576364, 23.4862638251), (-9.3691650731, 22.6783705347), (-6.3256595121, 20.8235485627), (-1.4460519065, 17.7419)],
                knots=[0.6708512149, 0.6708512149, 0.6708512149, 0.6708512149, 0.9713675979, 0.9713675979, 0.9713675979, 0.9713675979], degree=3))
        make_face()
        with BuildLine():
            ThreePointArc((-5.0292, 17.7419), (-2.5558256983, 17.0579586594), (0, 16.8275))
            add(Edge.make_bspline(
                [(-1.4460519065, 17.7419), (-0.9811358651, 17.4482887168), (-0.4995521084, 17.1435405817), (0, 16.8275)],
                knots=[0.9713675979, 0.9713675979, 0.9713675979, 0.9713675979, 1, 1, 1, 1], degree=3))
            Line((-1.4460519065, 17.7419), (-5.0292, 17.7419))
        make_face()
        with BuildLine():
            Line((-3.175, 15.5575), (0, 15.5575))
            Line((0, 15.5575), (0, 16.8275))
            ThreePointArc((0, 16.8275), (-2.5558256983, 17.0579586594), (-5.0292, 17.7419))
            add(Edge.make_bspline(
                [(-5.0292, 17.7419), (-3.7846, 17.0137666667), (-3.175, 16.2856333333), (-3.175, 15.5575)],
                knots=[0, 0, 0, 0, 0.5, 0.5, 0.5, 0.5], degree=3))
        make_face()
        with BuildLine():
            ThreePointArc((0, 14.2875), (2.5558256983, 14.0570413406), (5.0292, 13.3731))
            add(Edge.make_bspline(
                [(5.0292, 13.3731), (3.7846, 14.1012333333), (3.175, 14.8293666667), (3.175, 15.5575)],
                knots=[0, 0, 0, 0, 0.5, 0.5, 0.5, 0.5], degree=3))
            Line((3.175, 15.5575), (0, 14.2875))
        make_face()
        with BuildLine():
            Line((0, 13.3731), (5.0292, 13.3731))
            ThreePointArc((5.0292, 13.3731), (2.5558256983, 14.0570413406), (0, 14.2875))
            Line((0, 14.2875), (0, 13.3731))
        make_face()
        with BuildLine():
            Line((0, 13.3731), (0, 14.2875))
            ThreePointArc((0, 14.2875), (-2.5558256983, 14.0570413406), (-5.0292, 13.3731))
            Line((-5.0292, 13.3731), (0, 13.3731))
        make_face()
        with BuildLine():
            ThreePointArc((-5.0292, 13.3731), (-2.5558256983, 14.0570413406), (0, 14.2875))
            Line((0, 14.2875), (-3.175, 15.5575))
            add(Edge.make_bspline(
                [(-3.175, 15.5575), (-3.175, 14.8293666667), (-3.7846, 14.1012333333), (-5.0292, 13.3731)],
                knots=[0.5, 0.5, 0.5, 0.5, 1, 1, 1, 1], degree=3))
        make_face()
        Polygon((-3.175, 15.5575), (0, 14.2875), (0, 15.5575), align=None)
        Polygon((0, 15.5575), (0, 14.2875), (3.175, 15.5575), align=None)
        with BuildLine():
            Line((0, 15.5575), (3.175, 15.5575))
            add(Edge.make_bspline(
                [(3.175, 15.5575), (3.175, 16.2856333333), (3.7846, 17.0137666667), (5.0292, 17.7419)],
                knots=[0.5, 0.5, 0.5, 0.5, 1, 1, 1, 1], degree=3))
            ThreePointArc((5.0292, 17.7419), (2.5558256983, 17.0579586594), (0, 16.8275))
            Line((0, 16.8275), (0, 15.5575))
        make_face()
        with BuildLine():
            ThreePointArc((0, 16.8275), (2.5558256983, 17.0579586594), (5.0292, 17.7419))
            Line((5.0292, 17.7419), (0, 17.7419))
            Line((0, 17.7419), (-1.4460519065, 17.7419))
            add(Edge.make_bspline(
                [(-1.4460519065, 17.7419), (-0.9811358651, 17.4482887168), (-0.4995521084, 17.1435405817), (0, 16.8275)],
                knots=[0.9713675979, 0.9713675979, 0.9713675979, 0.9713675979, 1, 1, 1, 1], degree=3))
        make_face()
    extrude(amount=F1_DEPTH)


solid = f1.part
